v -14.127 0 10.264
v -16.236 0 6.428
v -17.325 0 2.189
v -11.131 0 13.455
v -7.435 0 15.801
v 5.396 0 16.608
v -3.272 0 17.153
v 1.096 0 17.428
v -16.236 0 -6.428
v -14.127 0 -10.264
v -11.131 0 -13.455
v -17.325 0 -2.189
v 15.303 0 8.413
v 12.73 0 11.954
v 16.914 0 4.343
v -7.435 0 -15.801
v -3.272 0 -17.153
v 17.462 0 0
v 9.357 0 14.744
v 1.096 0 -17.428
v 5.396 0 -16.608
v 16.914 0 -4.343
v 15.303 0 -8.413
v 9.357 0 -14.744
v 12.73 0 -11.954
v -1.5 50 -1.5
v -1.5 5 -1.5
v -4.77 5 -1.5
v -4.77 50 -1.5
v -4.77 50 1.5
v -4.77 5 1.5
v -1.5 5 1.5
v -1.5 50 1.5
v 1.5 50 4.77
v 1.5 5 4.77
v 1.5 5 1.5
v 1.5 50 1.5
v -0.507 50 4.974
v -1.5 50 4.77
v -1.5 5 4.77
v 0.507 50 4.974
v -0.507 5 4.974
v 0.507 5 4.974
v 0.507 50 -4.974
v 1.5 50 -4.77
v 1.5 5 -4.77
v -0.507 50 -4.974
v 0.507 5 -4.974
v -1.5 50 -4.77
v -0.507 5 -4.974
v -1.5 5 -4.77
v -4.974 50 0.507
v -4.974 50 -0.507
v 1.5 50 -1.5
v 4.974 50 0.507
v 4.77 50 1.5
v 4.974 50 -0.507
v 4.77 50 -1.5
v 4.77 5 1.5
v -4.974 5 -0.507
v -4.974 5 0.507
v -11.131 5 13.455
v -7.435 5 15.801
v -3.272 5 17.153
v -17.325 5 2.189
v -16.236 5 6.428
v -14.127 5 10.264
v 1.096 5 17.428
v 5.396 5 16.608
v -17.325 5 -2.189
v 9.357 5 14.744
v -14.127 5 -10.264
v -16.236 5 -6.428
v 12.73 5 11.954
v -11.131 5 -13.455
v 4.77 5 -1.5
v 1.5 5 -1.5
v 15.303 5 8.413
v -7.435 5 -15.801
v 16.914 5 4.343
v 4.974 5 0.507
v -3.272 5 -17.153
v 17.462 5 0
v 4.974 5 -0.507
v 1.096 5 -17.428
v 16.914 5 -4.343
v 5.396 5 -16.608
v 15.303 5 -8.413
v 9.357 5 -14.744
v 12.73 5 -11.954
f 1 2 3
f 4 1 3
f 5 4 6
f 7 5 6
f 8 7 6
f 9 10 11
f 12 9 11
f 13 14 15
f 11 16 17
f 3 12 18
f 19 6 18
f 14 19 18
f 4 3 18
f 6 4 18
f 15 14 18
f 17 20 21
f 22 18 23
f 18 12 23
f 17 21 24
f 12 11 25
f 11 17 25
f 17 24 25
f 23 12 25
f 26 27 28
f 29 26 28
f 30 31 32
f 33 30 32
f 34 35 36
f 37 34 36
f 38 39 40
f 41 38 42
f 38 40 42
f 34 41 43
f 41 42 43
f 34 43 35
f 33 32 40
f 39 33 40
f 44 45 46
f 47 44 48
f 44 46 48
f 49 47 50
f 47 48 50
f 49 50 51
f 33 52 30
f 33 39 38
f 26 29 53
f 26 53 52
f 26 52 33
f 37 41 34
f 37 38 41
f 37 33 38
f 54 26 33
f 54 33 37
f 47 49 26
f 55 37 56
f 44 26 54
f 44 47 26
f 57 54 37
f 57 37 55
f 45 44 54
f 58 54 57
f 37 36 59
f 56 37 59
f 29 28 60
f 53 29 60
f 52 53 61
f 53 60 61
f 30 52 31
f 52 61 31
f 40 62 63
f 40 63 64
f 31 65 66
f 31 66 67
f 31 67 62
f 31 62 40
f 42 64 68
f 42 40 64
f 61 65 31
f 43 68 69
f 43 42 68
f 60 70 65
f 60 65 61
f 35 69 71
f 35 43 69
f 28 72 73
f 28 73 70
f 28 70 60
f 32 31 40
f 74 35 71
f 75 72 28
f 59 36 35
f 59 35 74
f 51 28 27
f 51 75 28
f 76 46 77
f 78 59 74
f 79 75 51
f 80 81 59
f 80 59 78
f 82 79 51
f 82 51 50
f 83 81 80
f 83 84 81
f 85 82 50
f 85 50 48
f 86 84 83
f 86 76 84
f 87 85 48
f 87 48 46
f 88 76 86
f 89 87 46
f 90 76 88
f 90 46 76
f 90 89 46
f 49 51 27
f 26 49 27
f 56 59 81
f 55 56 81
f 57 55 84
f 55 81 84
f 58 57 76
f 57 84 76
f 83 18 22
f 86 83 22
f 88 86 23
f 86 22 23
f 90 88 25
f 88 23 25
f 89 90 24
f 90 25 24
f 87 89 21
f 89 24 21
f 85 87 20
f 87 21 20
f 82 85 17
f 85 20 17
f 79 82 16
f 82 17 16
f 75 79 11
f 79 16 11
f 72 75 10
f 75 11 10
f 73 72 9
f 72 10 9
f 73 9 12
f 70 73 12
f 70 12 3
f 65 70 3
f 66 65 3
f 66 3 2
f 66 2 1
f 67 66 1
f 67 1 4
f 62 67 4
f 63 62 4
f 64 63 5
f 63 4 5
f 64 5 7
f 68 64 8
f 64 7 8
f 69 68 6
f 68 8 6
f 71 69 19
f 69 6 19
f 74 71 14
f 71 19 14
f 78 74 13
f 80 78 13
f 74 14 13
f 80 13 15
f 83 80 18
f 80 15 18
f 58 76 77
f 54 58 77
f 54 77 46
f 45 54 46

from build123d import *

# Parameters (mm, degrees)
SKETCH1_R               = 17.4625
BOSS_EXTRUDE1_DEPTH     = 5
BOSS_EXTRUDE2_START     = 127
SKETCH1_2_R             = 17.4625
BOSS_EXTRUDE2_DEPTH     = 5
BOSS_EXTRUDE3_DEPTH     = 122
SKETCH3_W               = 34.925
SKETCH3_H               = 82
CUT_EXTRUDE1_DEPTH      = 18.4625
CUT_EXTRUDE1_DEPTH_BACK = 18.4625


with BuildPart() as part:
    # Sketch1 → Boss-Extrude1 (new body)
    with BuildSketch(Plane(origin=(0, 0, 0), x_dir=(1, 0, 0), z_dir=(0, 1, 0))):
        Circle(SKETCH1_R)
    extrude(amount=BOSS_EXTRUDE1_DEPTH)



with BuildPart() as body_2:
    # Sketch1<2> → Boss-Extrude2 (new body)
    with BuildSketch(Plane(origin=(0, 0, 0), x_dir=(1, 0, 0), z_dir=(0, 1, 0)).offset(BOSS_EXTRUDE2_START)):
        Circle(SKETCH1_2_R)
    extrude(amount=BOSS_EXTRUDE2_DEPTH)


with BuildPart() as part_1:
    add(part.part)

    add(body_2.part)  # Boss-Extrude3 merges body 2
    # Sketch2 → Boss-Extrude3 (add)
    with BuildSketch(Plane(origin=(0, 5, 0), x_dir=(1, 0, 0), z_dir=(0, 1, 0))):
        with BuildLine():
            Line((-4.769696007, -1.5), (-1.5, -1.5))
            Line((-1.5, -1.5), (-1.5, -4.769696007))
            ThreePointArc((-1.5, -4.769696007), (0, -5), (1.5, -4.769696007))
            Line((1.5, -4.769696007), (1.5, -1.5))
            Line((1.5, -1.5), (4.769696007, -1.5))
            ThreePointArc((4.769696007, -1.5), (5, 0), (4.769696007, 1.5))
            Line((4.769696007, 1.5), (1.5, 1.5))
            Line((1.5, 1.5), (1.5, 4.769696007))
            ThreePointArc((1.5, 4.769696007), (0, 5), (-1.5, 4.769696007))
            Line((-1.5, 4.769696007), (-1.5, 1.5))
            Line((-1.5, 1.5), (-4.769696007, 1.5))
            ThreePointArc((-4.769696007, 1.5), (-5, 0), (-4.769696007, -1.5))
        make_face()
    extrude(amount=BOSS_EXTRUDE3_DEPTH)

    # Sketch3 → Cut-Extrude1 (cut, two sides)
    with BuildSketch(Plane.XY) as cut_extrude1_sk:
        with Locations((0, 91)):
            Rectangle(SKETCH3_W, SKETCH3_H)
    extrude(amount=CUT_EXTRUDE1_DEPTH, mode=Mode.SUBTRACT)
    extrude(cut_extrude1_sk.sketch, amount=-CUT_EXTRUDE1_DEPTH_BACK, mode=Mode.SUBTRACT)


solid = part_1.part
